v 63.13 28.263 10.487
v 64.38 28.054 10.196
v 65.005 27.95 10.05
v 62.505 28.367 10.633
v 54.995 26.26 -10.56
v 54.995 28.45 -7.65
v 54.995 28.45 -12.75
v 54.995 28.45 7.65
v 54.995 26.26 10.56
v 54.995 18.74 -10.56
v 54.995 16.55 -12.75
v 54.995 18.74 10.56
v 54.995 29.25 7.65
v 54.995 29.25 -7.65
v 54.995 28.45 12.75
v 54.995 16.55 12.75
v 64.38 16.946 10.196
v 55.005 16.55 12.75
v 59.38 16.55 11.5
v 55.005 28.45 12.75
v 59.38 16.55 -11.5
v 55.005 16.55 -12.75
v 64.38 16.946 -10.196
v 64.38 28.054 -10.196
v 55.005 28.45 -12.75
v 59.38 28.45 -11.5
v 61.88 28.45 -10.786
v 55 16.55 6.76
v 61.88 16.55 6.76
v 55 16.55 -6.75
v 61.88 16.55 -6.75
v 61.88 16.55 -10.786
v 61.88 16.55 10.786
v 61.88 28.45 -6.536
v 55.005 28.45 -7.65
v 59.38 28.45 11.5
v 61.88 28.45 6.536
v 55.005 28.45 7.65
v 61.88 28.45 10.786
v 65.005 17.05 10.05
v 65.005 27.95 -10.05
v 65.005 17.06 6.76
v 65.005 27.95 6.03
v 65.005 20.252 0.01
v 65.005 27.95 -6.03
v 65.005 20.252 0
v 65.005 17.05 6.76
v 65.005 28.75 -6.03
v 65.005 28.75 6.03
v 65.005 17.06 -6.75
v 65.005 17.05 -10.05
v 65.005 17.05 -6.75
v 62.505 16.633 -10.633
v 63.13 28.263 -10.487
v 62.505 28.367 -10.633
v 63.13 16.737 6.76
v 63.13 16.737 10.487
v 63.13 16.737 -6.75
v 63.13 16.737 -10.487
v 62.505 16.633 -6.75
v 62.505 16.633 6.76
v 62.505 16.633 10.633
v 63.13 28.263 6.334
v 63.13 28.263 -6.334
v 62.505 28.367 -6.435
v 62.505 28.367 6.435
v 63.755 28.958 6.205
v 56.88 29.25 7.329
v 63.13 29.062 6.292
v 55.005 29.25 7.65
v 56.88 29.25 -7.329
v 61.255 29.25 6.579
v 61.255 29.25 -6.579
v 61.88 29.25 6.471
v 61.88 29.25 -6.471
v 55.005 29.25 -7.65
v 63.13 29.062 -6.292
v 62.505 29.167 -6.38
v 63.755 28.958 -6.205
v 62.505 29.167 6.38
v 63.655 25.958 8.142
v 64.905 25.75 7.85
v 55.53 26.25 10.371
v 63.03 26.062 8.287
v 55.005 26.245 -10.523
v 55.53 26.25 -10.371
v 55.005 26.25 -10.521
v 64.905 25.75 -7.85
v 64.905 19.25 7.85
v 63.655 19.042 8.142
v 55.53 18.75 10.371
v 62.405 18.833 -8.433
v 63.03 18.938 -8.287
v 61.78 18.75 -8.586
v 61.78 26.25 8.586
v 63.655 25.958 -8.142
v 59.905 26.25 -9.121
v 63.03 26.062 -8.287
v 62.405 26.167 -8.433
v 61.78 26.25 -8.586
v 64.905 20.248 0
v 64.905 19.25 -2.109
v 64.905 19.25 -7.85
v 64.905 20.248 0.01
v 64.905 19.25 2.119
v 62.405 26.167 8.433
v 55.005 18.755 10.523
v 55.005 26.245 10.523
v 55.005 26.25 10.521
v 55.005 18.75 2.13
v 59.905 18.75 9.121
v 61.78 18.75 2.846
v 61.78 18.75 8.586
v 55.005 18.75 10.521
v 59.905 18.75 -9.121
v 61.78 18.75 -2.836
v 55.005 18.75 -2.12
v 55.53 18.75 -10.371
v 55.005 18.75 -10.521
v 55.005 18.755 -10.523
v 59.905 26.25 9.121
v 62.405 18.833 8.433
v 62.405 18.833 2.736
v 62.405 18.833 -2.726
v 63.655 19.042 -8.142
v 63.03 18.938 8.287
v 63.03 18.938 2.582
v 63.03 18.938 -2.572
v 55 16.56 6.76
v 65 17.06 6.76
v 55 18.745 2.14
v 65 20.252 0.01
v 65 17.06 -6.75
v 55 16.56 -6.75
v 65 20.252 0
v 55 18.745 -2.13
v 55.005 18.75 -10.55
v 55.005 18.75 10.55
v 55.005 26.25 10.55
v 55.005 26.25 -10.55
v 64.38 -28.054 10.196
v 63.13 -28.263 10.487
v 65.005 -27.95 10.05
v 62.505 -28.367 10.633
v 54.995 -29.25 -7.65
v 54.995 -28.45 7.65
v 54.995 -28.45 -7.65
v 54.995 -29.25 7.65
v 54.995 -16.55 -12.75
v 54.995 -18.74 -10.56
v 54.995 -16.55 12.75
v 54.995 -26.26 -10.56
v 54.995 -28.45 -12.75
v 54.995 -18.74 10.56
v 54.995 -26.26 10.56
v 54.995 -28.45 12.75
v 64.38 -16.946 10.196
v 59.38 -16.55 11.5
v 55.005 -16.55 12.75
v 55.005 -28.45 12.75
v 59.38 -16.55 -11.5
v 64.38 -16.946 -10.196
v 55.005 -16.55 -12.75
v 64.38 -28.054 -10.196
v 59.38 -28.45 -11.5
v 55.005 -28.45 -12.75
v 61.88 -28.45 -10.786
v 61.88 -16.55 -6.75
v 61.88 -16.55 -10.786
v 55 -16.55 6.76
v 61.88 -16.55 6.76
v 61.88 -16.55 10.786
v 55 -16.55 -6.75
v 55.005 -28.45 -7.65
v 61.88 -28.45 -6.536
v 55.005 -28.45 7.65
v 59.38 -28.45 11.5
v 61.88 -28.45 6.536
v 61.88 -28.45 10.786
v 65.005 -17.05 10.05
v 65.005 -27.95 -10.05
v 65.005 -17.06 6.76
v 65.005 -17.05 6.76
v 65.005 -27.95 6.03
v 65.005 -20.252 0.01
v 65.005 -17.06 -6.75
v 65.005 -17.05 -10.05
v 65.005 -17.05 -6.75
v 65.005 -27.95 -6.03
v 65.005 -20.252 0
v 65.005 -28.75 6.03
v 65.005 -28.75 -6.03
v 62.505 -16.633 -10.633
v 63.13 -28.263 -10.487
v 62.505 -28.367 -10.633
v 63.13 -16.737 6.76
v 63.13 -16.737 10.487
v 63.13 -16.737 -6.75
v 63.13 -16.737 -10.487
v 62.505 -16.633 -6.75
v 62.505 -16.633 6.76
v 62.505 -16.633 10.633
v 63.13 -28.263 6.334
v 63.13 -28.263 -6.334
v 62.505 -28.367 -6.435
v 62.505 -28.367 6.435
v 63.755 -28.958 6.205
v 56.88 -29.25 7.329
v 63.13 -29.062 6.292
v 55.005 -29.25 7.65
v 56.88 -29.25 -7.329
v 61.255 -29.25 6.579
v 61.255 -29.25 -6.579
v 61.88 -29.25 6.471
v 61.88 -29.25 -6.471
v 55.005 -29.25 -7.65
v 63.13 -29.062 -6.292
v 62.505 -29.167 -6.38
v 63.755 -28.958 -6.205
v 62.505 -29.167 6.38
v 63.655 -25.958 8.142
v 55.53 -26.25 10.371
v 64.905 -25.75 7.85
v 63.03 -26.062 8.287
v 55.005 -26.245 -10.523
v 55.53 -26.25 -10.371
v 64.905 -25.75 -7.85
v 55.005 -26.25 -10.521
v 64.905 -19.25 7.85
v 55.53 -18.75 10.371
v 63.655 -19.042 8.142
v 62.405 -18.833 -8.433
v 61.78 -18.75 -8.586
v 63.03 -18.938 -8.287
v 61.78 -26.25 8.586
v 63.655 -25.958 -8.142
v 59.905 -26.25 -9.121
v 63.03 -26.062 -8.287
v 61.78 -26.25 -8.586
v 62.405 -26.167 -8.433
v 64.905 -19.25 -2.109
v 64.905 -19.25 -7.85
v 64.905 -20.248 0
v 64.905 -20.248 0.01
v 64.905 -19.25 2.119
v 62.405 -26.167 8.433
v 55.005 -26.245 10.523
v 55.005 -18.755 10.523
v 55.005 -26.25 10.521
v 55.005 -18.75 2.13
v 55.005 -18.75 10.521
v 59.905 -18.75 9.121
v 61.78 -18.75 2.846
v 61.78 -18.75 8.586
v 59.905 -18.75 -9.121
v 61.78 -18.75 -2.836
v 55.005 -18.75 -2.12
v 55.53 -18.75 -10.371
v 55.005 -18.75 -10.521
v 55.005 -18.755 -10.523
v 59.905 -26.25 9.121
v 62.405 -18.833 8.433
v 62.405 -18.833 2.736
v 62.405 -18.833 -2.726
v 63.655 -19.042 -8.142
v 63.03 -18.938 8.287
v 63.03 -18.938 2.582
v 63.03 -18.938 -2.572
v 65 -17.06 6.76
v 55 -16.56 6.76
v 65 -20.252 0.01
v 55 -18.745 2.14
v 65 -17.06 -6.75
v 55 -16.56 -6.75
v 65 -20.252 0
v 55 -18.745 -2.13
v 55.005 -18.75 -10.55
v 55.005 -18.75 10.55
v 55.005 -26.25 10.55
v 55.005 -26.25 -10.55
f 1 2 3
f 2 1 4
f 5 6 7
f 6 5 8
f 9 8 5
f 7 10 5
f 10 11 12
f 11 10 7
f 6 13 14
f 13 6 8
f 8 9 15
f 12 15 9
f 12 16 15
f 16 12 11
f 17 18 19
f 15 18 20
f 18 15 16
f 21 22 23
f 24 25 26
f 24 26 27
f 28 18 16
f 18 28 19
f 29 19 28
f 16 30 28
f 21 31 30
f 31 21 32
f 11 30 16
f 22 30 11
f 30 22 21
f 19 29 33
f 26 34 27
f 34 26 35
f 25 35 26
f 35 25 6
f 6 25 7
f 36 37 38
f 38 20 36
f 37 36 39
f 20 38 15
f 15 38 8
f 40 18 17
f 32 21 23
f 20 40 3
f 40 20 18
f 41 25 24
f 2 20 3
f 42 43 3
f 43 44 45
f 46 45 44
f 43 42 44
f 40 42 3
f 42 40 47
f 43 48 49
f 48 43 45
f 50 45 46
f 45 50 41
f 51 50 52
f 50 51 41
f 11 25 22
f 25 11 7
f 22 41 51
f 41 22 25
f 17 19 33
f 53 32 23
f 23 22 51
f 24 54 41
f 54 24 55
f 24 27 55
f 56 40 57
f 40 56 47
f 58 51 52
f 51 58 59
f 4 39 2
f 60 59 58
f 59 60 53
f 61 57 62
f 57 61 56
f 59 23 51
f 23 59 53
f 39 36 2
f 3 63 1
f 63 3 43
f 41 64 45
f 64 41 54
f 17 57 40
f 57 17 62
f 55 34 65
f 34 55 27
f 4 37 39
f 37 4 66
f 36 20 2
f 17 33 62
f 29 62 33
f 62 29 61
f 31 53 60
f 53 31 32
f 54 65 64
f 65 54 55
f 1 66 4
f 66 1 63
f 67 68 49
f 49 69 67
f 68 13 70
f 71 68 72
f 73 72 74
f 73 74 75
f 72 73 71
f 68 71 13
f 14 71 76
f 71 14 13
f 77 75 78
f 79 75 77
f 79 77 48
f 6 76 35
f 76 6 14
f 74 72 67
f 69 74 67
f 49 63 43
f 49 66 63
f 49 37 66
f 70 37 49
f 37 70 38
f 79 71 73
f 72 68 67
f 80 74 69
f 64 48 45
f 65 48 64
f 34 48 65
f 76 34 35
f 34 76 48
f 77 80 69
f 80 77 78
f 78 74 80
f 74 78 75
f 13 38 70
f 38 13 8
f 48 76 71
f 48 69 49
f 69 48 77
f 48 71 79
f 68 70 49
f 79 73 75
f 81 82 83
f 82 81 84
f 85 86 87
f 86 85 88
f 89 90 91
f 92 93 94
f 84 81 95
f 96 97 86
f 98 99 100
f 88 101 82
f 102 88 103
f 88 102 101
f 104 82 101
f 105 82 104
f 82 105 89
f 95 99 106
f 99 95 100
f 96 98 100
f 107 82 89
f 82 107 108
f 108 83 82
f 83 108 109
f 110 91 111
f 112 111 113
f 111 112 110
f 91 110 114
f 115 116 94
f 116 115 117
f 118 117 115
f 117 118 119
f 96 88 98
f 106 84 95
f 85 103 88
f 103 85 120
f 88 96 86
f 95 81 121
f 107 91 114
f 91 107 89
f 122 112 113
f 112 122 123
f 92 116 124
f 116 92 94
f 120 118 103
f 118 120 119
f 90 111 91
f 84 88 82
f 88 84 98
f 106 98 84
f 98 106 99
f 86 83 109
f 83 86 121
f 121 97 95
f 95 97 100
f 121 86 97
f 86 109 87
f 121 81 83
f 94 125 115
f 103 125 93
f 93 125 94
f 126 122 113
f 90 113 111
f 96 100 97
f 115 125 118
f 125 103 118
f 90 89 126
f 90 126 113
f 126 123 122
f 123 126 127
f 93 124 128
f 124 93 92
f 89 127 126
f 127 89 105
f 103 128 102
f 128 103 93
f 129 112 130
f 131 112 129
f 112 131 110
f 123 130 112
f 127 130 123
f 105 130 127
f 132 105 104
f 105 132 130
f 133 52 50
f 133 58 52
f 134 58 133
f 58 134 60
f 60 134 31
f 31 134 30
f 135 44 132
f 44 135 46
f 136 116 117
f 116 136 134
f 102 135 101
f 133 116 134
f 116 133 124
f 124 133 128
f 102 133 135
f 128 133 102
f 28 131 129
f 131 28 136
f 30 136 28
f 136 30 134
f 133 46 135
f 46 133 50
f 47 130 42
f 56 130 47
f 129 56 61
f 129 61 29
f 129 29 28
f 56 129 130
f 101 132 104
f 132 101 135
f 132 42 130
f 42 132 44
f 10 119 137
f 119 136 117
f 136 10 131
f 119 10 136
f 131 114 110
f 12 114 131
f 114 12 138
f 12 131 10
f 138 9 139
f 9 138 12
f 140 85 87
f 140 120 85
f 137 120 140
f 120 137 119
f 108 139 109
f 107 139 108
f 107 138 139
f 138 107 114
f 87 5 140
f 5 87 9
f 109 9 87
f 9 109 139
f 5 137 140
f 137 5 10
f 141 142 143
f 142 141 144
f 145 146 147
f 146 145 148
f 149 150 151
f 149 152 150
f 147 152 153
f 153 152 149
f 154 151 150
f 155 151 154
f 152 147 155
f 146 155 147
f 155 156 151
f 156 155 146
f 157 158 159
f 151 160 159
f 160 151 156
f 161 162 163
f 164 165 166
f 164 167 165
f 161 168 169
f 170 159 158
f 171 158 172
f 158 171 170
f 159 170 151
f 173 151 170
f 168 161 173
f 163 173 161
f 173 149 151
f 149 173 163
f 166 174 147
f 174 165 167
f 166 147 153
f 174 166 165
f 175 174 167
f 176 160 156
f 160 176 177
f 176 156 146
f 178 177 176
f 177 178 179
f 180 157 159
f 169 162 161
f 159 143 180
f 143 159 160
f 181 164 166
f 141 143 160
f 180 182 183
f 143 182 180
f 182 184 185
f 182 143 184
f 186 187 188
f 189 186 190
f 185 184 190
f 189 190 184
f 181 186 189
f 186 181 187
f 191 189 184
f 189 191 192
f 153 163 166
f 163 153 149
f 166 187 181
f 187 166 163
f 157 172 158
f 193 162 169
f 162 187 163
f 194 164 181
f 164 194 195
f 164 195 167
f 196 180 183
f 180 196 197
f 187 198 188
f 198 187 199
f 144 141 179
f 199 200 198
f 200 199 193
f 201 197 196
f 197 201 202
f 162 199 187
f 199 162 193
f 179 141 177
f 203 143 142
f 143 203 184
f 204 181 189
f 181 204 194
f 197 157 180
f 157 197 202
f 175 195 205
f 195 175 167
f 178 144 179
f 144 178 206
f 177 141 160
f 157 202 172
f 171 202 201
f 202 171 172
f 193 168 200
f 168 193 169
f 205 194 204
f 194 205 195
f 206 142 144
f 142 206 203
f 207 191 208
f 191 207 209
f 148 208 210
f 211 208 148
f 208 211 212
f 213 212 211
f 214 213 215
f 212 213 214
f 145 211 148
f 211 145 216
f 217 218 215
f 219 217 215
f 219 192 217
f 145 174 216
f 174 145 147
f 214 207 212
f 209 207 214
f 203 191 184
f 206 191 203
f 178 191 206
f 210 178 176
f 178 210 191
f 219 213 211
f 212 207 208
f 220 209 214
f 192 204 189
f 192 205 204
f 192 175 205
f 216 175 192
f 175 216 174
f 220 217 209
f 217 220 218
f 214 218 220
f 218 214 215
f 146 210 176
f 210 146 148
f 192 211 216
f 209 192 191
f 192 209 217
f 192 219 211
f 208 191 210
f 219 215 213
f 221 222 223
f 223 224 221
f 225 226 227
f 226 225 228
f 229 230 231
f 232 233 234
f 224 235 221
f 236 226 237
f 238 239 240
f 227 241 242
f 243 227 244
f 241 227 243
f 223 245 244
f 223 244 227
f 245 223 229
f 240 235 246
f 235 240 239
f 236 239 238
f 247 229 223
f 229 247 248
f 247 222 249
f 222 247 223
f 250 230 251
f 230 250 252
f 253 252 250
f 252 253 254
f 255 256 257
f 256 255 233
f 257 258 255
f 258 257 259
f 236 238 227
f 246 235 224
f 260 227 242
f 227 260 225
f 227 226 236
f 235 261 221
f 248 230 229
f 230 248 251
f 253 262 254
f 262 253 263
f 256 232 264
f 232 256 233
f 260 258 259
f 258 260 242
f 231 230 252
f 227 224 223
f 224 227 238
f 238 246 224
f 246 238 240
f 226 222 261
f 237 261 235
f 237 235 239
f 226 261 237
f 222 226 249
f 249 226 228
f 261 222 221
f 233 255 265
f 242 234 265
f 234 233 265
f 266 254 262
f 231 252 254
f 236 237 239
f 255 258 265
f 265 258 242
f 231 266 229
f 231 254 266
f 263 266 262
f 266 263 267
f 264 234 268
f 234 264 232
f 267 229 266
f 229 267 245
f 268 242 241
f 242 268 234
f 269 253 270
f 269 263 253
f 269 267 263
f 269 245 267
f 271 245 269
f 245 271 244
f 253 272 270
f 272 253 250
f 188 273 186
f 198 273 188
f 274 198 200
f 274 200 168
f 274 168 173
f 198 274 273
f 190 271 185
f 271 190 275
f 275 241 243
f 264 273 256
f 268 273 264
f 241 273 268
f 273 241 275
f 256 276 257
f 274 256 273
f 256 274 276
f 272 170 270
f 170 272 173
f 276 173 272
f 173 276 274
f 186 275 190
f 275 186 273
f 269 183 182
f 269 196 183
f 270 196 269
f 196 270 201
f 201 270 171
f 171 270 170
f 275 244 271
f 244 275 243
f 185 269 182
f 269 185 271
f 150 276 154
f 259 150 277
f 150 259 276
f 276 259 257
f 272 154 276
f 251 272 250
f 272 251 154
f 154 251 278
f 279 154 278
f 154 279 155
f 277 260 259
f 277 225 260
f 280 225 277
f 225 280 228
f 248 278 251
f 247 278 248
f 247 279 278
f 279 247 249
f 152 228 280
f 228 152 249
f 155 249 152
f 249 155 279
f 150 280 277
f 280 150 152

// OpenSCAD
// ============================================================
//  OMX_F Gripper — V-Groove Tip Insert
//  Target: 13 mm OD glass test tube
//  Zone  : blade X = 55 → 65 mm (finger-local frame)
//  Print : TPU 95A recommended (glass-safe, high friction)
//
//  Geometry logic
//  ─────────────
//  • Insert slides onto blade tip from +X (open end faces housing)
//  • C-clip profile wraps blade in Y and Z → friction fit
//  • 90° V-groove on inner face (-Y for link6, +Y for link7)
//    sized for 13 mm tube: groove_width=13 mm, depth≈2.7 mm
//  • Mirrored in Y for link7 (inner face = +Y)
// ============================================================

// ── USER PARAMETERS ─────────────────────────────────────────

tube_od       = 13.0;   // target tube outer diameter (mm)
clearance     = 0.25;   // blade fit clearance (mm) — reduce if loose
wall          = 2.2;    // min wall around blade (mm)
clip_lip      = 0.8;    // snap-fit undercut depth on outer Y face (mm)
groove_angle  = 90;     // V-groove included angle (deg) — 90° = self-centering
show_phantom  = false;  // show translucent blade for alignment check
which_finger  = "both"; // "link6" | "link7" | "both"

// ── BLADE CROSS-SECTION TABLE (X=55..65 zone only) ──────────
//   [ X, half_Y, half_Z ]
blade_pts = [
    [ 55, 3.5, 10.3 ],
    [ 62, 3.5,  8.3 ],
    [ 65, 3.0,  7.6 ],
];

X_START = 55;
X_END   = 65;
INS_LEN = X_END - X_START;  // 10 mm

// ── DERIVED ──────────────────────────────────────────────────
tube_r       = tube_od / 2;
groove_half  = tan(groove_angle/2) * tube_r;   // half-width at groove mouth
groove_depth = tube_r * (1/sin(groove_angle/2) - 1); // tube center height
// For 90°: groove_half=6.5 mm, groove_depth≈2.69 mm

// ── HELPERS ──────────────────────────────────────────────────
function lerp(a, b, t) = a + (b-a)*t;

// Blade half_Y at local X (linear interp across 3 pts)
function bhy(x) =
    (x <= blade_pts[1][0])
        ? lerp(blade_pts[0][1], blade_pts[1][1],
               (x-blade_pts[0][0])/(blade_pts[1][0]-blade_pts[0][0]))
        : lerp(blade_pts[1][1], blade_pts[2][1],
               (x-blade_pts[1][0])/(blade_pts[2][0]-blade_pts[1][0]));

// Blade half_Z at local X
function bhz(x) =
    (x <= blade_pts[1][0])
        ? lerp(blade_pts[0][2], blade_pts[1][2],
               (x-blade_pts[0][0])/(blade_pts[1][0]-blade_pts[0][0]))
        : lerp(blade_pts[1][2], blade_pts[2][2],
               (x-blade_pts[1][0])/(blade_pts[2][0]-blade_pts[1][0]));

N = 16;  // hull slices

// ── MODULES ──────────────────────────────────────────────────

// Outer body of the insert (blade envelope + wall)
module insert_outer() {
    hull()
        for (i = [0:N]) {
            x = X_START + i * INS_LEN / N;
            hy = bhy(x) + wall + clearance;
            hz = bhz(x) + wall + clearance;
            translate([x, 0, 0])
                cube([0.01, hy*2, hz*2], center=true);
        }
}

// Blade cavity (blade shape + clearance)
module blade_cavity() {
    // Full pass-through cavity — open at X_START end for sliding
    translate([-0.1, 0, 0])   // extend slightly past start
    hull()
        for (i = [0:N]) {
            x = X_START + i * INS_LEN / N;
            hy = bhy(x) + clearance;
            hz = bhz(x) + clearance;
            translate([x, 0, 0])
                cube([0.01, hy*2, hz*2], center=true);
        }
}

// 90° V-groove running full length on the inner -Y face
// The groove is centered in Z, open toward -Y
module v_groove() {
    // Prism: ▽ cross-section, extruded along X
    // At each X position the groove mouth width = 2*groove_half
    // and depth = groove_depth
    // We cut it slightly wider than calculated to ensure full tube contact
    gw = groove_half * 2 + 0.5;   // groove mouth width (Y)
    gd = groove_depth + 0.4;      // groove depth (into insert, Z direction... wait)

    // The V opens toward -Y (inner face).
    // We translate so the groove sits at the -Y face surface.
    hull()
        for (i = [0:N]) {
            x = X_START + i * INS_LEN / N;
            // -Y face is at y = -(bhy(x) + wall + clearance)
            face_y = -(bhy(x) + wall + clearance);
            translate([x, face_y + gd, 0])
                // Thin wedge: wide in Y, deep in -Y, zero in Z center
                rotate([0, 90, 0])
                    cylinder(r=0.01, h=0.01, center=true, $fn=3);
        }
    // Simpler approach: just use a linear_extrude-like approach via hull
    // Actually let's do a proper swept prism:
    linear_extrude_v_groove_inner();
}

// V-groove as a swept cut: separate module for clarity
module linear_extrude_v_groove_inner() {
    // Use minkowski or simple hull of wedge shapes per slice
    gw = groove_half * 2 + 0.5;
    gd = groove_depth + 0.5;

    hull()
        for (i = [0:N]) {
            x = X_START + i * INS_LEN / N;
            face_y = -(bhy(x) + wall + clearance);   // inner face -Y
            // The V tip is deepest inside the body (toward +Y)
            // The V mouth is at the face_y surface (outermost -Y)
            translate([x, 0, 0]) {
                // Mouth corners
                translate([0, face_y, -gw/2])
                    cube([0.01, 0.01, 0.01]);
                translate([0, face_y, +gw/2])
                    cube([0.01, 0.01, 0.01]);
                // V tip
                translate([0, face_y + gd, 0])
                    cube([0.01, 0.01, 0.01]);
            }
        }
}

// Snap-fit clip lip on outer +Y face (keeps insert from sliding off blade)
module clip_lip() {
    hull()
        for (i = [0:N]) {
            x = X_START + i * INS_LEN / N;
            hy_out = bhy(x) + wall + clearance;
            hz_out = bhz(x) + wall + clearance;
            translate([x, hy_out, 0])
                cube([0.01, clip_lip*2, hz_out*1.2], center=true);
        }
}

// Phantom blade for visual alignment check
module blade_phantom() {
    color("cyan", 0.2)
    hull()
        for (i = [0:N]) {
            x = X_START + i * INS_LEN / N;
            translate([x, 0, 0])
                cube([0.01, bhy(x)*2, bhz(x)*2], center=true);
        }
}

// Entry lead-in: chamfer the open end (X=55 side) so blade slides in
module entry_chamfer() {
    ch = 1.5;  // chamfer size
    hull() {
        // Normal profile at X_START
        translate([X_START, 0, 0]) {
            hy = bhy(X_START) + clearance;
            hz = bhz(X_START) + clearance;
            cube([0.01, hy*2, hz*2], center=true);
        }
        // Enlarged profile slightly before X_START
        translate([X_START - ch, 0, 0]) {
            hy = bhy(X_START) + clearance + ch;
            hz = bhz(X_START) + clearance + ch;
            cube([0.01, hy*2, hz*2], center=true);
        }
    }
}

// Complete insert for link6 (inner = -Y)
module insert_link6() {
    difference() {
        union() {
            insert_outer();
            clip_lip();         // snap ridge on outer +Y
        }
        blade_cavity();
        linear_extrude_v_groove_inner();  // V-groove on -Y face
        entry_chamfer();
    }
    if (show_phantom) blade_phantom();
}

// Complete insert for link7 (inner = +Y, mirror of link6)
module insert_link7() {
    scale([1, -1, 1])
        insert_link6();
}

// ── RENDER ───────────────────────────────────────────────────
SEP = 45;  // Y separation when showing both

if (which_finger == "link6") {
    insert_link6();
} else if (which_finger == "link7") {
    insert_link7();
} else {
    translate([0,  SEP/2, 0]) insert_link6();
    translate([0, -SEP/2, 0]) insert_link7();
}

// ============================================================
//  PRINT GUIDE
// ─────────────────────────────────────────────────────────────
//  Material  : TPU 95A  (Shore hardness gives compliance +
//              grip on glass; PLA/PETG alternative if no TPU)
//  Orientation: lay flat — X along bed, V-groove face up
//  Layer h   : 0.15 mm for smooth V surface
//  Walls     : 3 perimeters (no infill needed — solid is fine
//              for such a small part)
//  Supports  : none needed
//
//  FIT TUNING
//  ──────────
//  Too loose on blade → decrease clearance (try 0.15)
//  Too tight          → increase clearance (try 0.35)
//  Clip doesn't snap  → increase clip_lip (try 1.2)
//
//  V-GROOVE GEOMETRY (13 mm tube, 90° angle)
//  ──────────────────────────────────────────
//  groove mouth width : 13.0 mm
//  groove depth       : ~2.7 mm
//  tube contact angle : 45° from vertical on each side
//  → tube self-centers and cannot roll out during motion
// ============================================================
